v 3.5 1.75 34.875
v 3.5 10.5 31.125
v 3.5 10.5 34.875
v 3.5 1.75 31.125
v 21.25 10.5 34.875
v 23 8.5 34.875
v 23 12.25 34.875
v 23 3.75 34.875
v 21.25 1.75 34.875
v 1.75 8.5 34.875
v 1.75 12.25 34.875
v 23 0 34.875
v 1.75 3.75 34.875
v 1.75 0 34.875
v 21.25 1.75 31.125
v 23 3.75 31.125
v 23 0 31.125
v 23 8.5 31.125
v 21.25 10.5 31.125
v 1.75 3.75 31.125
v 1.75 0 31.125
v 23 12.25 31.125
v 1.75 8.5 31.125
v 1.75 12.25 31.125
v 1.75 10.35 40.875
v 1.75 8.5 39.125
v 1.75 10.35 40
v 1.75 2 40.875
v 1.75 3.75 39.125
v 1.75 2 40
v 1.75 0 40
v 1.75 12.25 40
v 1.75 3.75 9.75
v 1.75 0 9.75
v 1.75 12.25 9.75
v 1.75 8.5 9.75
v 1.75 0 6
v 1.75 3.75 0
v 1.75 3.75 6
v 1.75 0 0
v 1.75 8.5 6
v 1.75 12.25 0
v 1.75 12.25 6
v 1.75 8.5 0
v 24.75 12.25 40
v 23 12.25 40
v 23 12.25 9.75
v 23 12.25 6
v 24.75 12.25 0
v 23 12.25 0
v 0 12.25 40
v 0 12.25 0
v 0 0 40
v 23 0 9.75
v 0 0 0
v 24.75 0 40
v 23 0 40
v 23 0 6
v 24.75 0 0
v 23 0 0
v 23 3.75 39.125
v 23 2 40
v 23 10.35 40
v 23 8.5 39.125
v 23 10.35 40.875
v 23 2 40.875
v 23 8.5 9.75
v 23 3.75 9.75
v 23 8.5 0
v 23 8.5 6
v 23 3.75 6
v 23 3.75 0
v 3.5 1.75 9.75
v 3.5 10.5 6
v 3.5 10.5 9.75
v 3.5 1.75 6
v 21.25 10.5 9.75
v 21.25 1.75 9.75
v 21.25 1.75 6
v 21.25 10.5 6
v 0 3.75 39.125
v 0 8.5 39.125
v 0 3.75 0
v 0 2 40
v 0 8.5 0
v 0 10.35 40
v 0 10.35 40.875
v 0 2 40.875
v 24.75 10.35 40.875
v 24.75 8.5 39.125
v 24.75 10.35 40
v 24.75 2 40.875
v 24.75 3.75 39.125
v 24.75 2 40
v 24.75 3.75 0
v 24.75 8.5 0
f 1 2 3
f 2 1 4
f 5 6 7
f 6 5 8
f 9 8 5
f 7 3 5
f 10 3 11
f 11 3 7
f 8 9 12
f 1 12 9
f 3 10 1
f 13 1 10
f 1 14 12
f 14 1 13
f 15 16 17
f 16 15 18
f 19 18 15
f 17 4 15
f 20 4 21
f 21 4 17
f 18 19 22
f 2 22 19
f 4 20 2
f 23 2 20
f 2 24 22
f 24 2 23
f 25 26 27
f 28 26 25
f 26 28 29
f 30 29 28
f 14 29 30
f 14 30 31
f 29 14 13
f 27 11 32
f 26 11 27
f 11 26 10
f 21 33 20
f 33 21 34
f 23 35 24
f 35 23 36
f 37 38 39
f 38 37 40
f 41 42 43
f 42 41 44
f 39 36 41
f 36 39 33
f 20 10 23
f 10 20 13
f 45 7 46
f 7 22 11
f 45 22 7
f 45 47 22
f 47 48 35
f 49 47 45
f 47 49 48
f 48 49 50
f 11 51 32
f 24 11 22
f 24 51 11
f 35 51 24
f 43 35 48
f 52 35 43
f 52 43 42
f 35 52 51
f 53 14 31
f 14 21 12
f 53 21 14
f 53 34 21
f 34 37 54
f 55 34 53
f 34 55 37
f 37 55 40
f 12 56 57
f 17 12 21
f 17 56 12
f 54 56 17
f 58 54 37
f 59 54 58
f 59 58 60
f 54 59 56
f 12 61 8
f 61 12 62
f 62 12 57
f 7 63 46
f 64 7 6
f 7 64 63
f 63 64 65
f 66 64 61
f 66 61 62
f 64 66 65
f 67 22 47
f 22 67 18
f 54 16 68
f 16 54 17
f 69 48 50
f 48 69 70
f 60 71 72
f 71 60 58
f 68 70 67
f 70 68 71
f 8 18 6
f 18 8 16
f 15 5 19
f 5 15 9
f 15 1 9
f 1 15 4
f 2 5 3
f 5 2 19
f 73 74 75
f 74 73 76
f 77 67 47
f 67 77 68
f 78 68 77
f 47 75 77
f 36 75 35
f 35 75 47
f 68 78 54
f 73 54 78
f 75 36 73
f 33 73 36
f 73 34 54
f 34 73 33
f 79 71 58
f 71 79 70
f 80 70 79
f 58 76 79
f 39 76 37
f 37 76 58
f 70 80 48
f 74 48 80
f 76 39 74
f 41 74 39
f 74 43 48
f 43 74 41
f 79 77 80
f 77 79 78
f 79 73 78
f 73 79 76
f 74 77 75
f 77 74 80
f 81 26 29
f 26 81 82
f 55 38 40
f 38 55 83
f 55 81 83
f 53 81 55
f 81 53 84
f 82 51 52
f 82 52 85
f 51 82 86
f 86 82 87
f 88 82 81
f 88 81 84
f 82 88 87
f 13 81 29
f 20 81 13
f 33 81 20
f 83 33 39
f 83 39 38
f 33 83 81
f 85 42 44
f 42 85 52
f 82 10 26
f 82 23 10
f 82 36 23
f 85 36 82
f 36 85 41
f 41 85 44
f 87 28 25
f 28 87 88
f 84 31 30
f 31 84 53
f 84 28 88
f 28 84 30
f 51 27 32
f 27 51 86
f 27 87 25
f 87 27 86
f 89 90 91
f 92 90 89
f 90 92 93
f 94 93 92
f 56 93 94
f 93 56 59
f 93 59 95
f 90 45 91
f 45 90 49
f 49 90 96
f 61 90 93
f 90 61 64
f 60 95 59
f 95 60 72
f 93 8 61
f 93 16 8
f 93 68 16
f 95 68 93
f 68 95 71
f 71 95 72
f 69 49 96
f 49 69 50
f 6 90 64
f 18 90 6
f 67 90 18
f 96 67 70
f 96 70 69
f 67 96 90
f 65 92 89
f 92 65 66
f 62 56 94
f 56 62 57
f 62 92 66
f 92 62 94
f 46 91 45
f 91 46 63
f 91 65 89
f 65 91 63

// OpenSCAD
inner_width = 17.75;
outer_width = 19;
// https://www.server-racks.com/rack-mount-depth.html
dell_standard_depth = 28 + 7 / 8;
u = 1.75;
board_2_in = 2 - 0.25;
board_4_in = 4 - 0.25;

rack(u_capacity=5, clearance=6);

module rack(u_capacity=1, clearance=6)
{
  translate([board_2_in, 0, dell_standard_depth + clearance])
  {
    translate([0, 0, -board_4_in])
    {
      translate([board_2_in, board_2_in, board_4_in]) rotate([-90, 0, 0])
        %rackmount_unit(u_capacity);
      
      support_ring(u_capacity);
      translate([0, 0, -(dell_standard_depth - board_4_in)])
        support_ring(u_capacity);
    }
  
    translate([-board_2_in, 0, -(dell_standard_depth + clearance)])
      side(u_capacity, clearance);
    translate([inner_width + 2 * board_2_in, 0, -(dell_standard_depth + clearance)])
      side(u_capacity, clearance);
  }
}

module side(u_capacity, clearance)
{
  handle_height = board_2_in;
  color([0.8, 0.8, 0])
  {
    leg();
    translate([0, u * u_capacity  + 2 * board_2_in - board_4_in, 0])
      leg();
  }

  color([1, 1, 0])
    handle();

  module handle()
  {
    translate([0, 0, dell_standard_depth + 2 * clearance - handle_height])
    {
      difference()
      {
        cube([board_2_in, u * u_capacity + 2 * board_2_in, handle_height]);
        translate([-0.1, -0.1, handle_height / 2])
          cube([board_2_in + 0.2, 2 + 0.1, handle_height / 2 + 0.1]);
        translate([-0.1, u * u_capacity + 2 * board_2_in - 2 + 0.1, handle_height / 2])
          cube([board_2_in + 0.2, 2 + 0.1, handle_height / 2 + 0.1]);
      }
    }
  }

  module leg()
  {
    cube([board_2_in, board_4_in, dell_standard_depth + 2 * clearance - handle_height]);
  }
}

module support_ring(u_capacity=1)
{
  color([0.6, 0.6, 0])
  cube([board_2_in, u_capacity * u + 2 * board_2_in, board_4_in]);
  color([0.6, 0.6, 0])
  translate([board_2_in + inner_width, 0, 0])
    cube([board_2_in, u_capacity * u + 2 * (board_2_in), board_4_in]);
  color([0.4, 0.4, 0])
  translate([board_2_in, 0, 0])
    cube([inner_width, board_2_in, board_4_in]);
  color([0.4, 0.4, 0])
  translate([board_2_in, u_capacity * u + board_2_in, 0])
    cube([inner_width, board_2_in, board_4_in]);
}

module rackmount_unit(u_size=1)
{
  height = u * u_size;
  cube([inner_width, dell_standard_depth, height]);
  translate([-(outer_width - inner_width) / 2, -1 / 8, 0])
    cube([outer_width, 1 / 8, height]);
}

module board(nominal_width, nominal_height, depth)
{
  width = nominal_width - 0.25;
  height = nominal_height - 0.25;
  cube([height, depth, width]);
}
